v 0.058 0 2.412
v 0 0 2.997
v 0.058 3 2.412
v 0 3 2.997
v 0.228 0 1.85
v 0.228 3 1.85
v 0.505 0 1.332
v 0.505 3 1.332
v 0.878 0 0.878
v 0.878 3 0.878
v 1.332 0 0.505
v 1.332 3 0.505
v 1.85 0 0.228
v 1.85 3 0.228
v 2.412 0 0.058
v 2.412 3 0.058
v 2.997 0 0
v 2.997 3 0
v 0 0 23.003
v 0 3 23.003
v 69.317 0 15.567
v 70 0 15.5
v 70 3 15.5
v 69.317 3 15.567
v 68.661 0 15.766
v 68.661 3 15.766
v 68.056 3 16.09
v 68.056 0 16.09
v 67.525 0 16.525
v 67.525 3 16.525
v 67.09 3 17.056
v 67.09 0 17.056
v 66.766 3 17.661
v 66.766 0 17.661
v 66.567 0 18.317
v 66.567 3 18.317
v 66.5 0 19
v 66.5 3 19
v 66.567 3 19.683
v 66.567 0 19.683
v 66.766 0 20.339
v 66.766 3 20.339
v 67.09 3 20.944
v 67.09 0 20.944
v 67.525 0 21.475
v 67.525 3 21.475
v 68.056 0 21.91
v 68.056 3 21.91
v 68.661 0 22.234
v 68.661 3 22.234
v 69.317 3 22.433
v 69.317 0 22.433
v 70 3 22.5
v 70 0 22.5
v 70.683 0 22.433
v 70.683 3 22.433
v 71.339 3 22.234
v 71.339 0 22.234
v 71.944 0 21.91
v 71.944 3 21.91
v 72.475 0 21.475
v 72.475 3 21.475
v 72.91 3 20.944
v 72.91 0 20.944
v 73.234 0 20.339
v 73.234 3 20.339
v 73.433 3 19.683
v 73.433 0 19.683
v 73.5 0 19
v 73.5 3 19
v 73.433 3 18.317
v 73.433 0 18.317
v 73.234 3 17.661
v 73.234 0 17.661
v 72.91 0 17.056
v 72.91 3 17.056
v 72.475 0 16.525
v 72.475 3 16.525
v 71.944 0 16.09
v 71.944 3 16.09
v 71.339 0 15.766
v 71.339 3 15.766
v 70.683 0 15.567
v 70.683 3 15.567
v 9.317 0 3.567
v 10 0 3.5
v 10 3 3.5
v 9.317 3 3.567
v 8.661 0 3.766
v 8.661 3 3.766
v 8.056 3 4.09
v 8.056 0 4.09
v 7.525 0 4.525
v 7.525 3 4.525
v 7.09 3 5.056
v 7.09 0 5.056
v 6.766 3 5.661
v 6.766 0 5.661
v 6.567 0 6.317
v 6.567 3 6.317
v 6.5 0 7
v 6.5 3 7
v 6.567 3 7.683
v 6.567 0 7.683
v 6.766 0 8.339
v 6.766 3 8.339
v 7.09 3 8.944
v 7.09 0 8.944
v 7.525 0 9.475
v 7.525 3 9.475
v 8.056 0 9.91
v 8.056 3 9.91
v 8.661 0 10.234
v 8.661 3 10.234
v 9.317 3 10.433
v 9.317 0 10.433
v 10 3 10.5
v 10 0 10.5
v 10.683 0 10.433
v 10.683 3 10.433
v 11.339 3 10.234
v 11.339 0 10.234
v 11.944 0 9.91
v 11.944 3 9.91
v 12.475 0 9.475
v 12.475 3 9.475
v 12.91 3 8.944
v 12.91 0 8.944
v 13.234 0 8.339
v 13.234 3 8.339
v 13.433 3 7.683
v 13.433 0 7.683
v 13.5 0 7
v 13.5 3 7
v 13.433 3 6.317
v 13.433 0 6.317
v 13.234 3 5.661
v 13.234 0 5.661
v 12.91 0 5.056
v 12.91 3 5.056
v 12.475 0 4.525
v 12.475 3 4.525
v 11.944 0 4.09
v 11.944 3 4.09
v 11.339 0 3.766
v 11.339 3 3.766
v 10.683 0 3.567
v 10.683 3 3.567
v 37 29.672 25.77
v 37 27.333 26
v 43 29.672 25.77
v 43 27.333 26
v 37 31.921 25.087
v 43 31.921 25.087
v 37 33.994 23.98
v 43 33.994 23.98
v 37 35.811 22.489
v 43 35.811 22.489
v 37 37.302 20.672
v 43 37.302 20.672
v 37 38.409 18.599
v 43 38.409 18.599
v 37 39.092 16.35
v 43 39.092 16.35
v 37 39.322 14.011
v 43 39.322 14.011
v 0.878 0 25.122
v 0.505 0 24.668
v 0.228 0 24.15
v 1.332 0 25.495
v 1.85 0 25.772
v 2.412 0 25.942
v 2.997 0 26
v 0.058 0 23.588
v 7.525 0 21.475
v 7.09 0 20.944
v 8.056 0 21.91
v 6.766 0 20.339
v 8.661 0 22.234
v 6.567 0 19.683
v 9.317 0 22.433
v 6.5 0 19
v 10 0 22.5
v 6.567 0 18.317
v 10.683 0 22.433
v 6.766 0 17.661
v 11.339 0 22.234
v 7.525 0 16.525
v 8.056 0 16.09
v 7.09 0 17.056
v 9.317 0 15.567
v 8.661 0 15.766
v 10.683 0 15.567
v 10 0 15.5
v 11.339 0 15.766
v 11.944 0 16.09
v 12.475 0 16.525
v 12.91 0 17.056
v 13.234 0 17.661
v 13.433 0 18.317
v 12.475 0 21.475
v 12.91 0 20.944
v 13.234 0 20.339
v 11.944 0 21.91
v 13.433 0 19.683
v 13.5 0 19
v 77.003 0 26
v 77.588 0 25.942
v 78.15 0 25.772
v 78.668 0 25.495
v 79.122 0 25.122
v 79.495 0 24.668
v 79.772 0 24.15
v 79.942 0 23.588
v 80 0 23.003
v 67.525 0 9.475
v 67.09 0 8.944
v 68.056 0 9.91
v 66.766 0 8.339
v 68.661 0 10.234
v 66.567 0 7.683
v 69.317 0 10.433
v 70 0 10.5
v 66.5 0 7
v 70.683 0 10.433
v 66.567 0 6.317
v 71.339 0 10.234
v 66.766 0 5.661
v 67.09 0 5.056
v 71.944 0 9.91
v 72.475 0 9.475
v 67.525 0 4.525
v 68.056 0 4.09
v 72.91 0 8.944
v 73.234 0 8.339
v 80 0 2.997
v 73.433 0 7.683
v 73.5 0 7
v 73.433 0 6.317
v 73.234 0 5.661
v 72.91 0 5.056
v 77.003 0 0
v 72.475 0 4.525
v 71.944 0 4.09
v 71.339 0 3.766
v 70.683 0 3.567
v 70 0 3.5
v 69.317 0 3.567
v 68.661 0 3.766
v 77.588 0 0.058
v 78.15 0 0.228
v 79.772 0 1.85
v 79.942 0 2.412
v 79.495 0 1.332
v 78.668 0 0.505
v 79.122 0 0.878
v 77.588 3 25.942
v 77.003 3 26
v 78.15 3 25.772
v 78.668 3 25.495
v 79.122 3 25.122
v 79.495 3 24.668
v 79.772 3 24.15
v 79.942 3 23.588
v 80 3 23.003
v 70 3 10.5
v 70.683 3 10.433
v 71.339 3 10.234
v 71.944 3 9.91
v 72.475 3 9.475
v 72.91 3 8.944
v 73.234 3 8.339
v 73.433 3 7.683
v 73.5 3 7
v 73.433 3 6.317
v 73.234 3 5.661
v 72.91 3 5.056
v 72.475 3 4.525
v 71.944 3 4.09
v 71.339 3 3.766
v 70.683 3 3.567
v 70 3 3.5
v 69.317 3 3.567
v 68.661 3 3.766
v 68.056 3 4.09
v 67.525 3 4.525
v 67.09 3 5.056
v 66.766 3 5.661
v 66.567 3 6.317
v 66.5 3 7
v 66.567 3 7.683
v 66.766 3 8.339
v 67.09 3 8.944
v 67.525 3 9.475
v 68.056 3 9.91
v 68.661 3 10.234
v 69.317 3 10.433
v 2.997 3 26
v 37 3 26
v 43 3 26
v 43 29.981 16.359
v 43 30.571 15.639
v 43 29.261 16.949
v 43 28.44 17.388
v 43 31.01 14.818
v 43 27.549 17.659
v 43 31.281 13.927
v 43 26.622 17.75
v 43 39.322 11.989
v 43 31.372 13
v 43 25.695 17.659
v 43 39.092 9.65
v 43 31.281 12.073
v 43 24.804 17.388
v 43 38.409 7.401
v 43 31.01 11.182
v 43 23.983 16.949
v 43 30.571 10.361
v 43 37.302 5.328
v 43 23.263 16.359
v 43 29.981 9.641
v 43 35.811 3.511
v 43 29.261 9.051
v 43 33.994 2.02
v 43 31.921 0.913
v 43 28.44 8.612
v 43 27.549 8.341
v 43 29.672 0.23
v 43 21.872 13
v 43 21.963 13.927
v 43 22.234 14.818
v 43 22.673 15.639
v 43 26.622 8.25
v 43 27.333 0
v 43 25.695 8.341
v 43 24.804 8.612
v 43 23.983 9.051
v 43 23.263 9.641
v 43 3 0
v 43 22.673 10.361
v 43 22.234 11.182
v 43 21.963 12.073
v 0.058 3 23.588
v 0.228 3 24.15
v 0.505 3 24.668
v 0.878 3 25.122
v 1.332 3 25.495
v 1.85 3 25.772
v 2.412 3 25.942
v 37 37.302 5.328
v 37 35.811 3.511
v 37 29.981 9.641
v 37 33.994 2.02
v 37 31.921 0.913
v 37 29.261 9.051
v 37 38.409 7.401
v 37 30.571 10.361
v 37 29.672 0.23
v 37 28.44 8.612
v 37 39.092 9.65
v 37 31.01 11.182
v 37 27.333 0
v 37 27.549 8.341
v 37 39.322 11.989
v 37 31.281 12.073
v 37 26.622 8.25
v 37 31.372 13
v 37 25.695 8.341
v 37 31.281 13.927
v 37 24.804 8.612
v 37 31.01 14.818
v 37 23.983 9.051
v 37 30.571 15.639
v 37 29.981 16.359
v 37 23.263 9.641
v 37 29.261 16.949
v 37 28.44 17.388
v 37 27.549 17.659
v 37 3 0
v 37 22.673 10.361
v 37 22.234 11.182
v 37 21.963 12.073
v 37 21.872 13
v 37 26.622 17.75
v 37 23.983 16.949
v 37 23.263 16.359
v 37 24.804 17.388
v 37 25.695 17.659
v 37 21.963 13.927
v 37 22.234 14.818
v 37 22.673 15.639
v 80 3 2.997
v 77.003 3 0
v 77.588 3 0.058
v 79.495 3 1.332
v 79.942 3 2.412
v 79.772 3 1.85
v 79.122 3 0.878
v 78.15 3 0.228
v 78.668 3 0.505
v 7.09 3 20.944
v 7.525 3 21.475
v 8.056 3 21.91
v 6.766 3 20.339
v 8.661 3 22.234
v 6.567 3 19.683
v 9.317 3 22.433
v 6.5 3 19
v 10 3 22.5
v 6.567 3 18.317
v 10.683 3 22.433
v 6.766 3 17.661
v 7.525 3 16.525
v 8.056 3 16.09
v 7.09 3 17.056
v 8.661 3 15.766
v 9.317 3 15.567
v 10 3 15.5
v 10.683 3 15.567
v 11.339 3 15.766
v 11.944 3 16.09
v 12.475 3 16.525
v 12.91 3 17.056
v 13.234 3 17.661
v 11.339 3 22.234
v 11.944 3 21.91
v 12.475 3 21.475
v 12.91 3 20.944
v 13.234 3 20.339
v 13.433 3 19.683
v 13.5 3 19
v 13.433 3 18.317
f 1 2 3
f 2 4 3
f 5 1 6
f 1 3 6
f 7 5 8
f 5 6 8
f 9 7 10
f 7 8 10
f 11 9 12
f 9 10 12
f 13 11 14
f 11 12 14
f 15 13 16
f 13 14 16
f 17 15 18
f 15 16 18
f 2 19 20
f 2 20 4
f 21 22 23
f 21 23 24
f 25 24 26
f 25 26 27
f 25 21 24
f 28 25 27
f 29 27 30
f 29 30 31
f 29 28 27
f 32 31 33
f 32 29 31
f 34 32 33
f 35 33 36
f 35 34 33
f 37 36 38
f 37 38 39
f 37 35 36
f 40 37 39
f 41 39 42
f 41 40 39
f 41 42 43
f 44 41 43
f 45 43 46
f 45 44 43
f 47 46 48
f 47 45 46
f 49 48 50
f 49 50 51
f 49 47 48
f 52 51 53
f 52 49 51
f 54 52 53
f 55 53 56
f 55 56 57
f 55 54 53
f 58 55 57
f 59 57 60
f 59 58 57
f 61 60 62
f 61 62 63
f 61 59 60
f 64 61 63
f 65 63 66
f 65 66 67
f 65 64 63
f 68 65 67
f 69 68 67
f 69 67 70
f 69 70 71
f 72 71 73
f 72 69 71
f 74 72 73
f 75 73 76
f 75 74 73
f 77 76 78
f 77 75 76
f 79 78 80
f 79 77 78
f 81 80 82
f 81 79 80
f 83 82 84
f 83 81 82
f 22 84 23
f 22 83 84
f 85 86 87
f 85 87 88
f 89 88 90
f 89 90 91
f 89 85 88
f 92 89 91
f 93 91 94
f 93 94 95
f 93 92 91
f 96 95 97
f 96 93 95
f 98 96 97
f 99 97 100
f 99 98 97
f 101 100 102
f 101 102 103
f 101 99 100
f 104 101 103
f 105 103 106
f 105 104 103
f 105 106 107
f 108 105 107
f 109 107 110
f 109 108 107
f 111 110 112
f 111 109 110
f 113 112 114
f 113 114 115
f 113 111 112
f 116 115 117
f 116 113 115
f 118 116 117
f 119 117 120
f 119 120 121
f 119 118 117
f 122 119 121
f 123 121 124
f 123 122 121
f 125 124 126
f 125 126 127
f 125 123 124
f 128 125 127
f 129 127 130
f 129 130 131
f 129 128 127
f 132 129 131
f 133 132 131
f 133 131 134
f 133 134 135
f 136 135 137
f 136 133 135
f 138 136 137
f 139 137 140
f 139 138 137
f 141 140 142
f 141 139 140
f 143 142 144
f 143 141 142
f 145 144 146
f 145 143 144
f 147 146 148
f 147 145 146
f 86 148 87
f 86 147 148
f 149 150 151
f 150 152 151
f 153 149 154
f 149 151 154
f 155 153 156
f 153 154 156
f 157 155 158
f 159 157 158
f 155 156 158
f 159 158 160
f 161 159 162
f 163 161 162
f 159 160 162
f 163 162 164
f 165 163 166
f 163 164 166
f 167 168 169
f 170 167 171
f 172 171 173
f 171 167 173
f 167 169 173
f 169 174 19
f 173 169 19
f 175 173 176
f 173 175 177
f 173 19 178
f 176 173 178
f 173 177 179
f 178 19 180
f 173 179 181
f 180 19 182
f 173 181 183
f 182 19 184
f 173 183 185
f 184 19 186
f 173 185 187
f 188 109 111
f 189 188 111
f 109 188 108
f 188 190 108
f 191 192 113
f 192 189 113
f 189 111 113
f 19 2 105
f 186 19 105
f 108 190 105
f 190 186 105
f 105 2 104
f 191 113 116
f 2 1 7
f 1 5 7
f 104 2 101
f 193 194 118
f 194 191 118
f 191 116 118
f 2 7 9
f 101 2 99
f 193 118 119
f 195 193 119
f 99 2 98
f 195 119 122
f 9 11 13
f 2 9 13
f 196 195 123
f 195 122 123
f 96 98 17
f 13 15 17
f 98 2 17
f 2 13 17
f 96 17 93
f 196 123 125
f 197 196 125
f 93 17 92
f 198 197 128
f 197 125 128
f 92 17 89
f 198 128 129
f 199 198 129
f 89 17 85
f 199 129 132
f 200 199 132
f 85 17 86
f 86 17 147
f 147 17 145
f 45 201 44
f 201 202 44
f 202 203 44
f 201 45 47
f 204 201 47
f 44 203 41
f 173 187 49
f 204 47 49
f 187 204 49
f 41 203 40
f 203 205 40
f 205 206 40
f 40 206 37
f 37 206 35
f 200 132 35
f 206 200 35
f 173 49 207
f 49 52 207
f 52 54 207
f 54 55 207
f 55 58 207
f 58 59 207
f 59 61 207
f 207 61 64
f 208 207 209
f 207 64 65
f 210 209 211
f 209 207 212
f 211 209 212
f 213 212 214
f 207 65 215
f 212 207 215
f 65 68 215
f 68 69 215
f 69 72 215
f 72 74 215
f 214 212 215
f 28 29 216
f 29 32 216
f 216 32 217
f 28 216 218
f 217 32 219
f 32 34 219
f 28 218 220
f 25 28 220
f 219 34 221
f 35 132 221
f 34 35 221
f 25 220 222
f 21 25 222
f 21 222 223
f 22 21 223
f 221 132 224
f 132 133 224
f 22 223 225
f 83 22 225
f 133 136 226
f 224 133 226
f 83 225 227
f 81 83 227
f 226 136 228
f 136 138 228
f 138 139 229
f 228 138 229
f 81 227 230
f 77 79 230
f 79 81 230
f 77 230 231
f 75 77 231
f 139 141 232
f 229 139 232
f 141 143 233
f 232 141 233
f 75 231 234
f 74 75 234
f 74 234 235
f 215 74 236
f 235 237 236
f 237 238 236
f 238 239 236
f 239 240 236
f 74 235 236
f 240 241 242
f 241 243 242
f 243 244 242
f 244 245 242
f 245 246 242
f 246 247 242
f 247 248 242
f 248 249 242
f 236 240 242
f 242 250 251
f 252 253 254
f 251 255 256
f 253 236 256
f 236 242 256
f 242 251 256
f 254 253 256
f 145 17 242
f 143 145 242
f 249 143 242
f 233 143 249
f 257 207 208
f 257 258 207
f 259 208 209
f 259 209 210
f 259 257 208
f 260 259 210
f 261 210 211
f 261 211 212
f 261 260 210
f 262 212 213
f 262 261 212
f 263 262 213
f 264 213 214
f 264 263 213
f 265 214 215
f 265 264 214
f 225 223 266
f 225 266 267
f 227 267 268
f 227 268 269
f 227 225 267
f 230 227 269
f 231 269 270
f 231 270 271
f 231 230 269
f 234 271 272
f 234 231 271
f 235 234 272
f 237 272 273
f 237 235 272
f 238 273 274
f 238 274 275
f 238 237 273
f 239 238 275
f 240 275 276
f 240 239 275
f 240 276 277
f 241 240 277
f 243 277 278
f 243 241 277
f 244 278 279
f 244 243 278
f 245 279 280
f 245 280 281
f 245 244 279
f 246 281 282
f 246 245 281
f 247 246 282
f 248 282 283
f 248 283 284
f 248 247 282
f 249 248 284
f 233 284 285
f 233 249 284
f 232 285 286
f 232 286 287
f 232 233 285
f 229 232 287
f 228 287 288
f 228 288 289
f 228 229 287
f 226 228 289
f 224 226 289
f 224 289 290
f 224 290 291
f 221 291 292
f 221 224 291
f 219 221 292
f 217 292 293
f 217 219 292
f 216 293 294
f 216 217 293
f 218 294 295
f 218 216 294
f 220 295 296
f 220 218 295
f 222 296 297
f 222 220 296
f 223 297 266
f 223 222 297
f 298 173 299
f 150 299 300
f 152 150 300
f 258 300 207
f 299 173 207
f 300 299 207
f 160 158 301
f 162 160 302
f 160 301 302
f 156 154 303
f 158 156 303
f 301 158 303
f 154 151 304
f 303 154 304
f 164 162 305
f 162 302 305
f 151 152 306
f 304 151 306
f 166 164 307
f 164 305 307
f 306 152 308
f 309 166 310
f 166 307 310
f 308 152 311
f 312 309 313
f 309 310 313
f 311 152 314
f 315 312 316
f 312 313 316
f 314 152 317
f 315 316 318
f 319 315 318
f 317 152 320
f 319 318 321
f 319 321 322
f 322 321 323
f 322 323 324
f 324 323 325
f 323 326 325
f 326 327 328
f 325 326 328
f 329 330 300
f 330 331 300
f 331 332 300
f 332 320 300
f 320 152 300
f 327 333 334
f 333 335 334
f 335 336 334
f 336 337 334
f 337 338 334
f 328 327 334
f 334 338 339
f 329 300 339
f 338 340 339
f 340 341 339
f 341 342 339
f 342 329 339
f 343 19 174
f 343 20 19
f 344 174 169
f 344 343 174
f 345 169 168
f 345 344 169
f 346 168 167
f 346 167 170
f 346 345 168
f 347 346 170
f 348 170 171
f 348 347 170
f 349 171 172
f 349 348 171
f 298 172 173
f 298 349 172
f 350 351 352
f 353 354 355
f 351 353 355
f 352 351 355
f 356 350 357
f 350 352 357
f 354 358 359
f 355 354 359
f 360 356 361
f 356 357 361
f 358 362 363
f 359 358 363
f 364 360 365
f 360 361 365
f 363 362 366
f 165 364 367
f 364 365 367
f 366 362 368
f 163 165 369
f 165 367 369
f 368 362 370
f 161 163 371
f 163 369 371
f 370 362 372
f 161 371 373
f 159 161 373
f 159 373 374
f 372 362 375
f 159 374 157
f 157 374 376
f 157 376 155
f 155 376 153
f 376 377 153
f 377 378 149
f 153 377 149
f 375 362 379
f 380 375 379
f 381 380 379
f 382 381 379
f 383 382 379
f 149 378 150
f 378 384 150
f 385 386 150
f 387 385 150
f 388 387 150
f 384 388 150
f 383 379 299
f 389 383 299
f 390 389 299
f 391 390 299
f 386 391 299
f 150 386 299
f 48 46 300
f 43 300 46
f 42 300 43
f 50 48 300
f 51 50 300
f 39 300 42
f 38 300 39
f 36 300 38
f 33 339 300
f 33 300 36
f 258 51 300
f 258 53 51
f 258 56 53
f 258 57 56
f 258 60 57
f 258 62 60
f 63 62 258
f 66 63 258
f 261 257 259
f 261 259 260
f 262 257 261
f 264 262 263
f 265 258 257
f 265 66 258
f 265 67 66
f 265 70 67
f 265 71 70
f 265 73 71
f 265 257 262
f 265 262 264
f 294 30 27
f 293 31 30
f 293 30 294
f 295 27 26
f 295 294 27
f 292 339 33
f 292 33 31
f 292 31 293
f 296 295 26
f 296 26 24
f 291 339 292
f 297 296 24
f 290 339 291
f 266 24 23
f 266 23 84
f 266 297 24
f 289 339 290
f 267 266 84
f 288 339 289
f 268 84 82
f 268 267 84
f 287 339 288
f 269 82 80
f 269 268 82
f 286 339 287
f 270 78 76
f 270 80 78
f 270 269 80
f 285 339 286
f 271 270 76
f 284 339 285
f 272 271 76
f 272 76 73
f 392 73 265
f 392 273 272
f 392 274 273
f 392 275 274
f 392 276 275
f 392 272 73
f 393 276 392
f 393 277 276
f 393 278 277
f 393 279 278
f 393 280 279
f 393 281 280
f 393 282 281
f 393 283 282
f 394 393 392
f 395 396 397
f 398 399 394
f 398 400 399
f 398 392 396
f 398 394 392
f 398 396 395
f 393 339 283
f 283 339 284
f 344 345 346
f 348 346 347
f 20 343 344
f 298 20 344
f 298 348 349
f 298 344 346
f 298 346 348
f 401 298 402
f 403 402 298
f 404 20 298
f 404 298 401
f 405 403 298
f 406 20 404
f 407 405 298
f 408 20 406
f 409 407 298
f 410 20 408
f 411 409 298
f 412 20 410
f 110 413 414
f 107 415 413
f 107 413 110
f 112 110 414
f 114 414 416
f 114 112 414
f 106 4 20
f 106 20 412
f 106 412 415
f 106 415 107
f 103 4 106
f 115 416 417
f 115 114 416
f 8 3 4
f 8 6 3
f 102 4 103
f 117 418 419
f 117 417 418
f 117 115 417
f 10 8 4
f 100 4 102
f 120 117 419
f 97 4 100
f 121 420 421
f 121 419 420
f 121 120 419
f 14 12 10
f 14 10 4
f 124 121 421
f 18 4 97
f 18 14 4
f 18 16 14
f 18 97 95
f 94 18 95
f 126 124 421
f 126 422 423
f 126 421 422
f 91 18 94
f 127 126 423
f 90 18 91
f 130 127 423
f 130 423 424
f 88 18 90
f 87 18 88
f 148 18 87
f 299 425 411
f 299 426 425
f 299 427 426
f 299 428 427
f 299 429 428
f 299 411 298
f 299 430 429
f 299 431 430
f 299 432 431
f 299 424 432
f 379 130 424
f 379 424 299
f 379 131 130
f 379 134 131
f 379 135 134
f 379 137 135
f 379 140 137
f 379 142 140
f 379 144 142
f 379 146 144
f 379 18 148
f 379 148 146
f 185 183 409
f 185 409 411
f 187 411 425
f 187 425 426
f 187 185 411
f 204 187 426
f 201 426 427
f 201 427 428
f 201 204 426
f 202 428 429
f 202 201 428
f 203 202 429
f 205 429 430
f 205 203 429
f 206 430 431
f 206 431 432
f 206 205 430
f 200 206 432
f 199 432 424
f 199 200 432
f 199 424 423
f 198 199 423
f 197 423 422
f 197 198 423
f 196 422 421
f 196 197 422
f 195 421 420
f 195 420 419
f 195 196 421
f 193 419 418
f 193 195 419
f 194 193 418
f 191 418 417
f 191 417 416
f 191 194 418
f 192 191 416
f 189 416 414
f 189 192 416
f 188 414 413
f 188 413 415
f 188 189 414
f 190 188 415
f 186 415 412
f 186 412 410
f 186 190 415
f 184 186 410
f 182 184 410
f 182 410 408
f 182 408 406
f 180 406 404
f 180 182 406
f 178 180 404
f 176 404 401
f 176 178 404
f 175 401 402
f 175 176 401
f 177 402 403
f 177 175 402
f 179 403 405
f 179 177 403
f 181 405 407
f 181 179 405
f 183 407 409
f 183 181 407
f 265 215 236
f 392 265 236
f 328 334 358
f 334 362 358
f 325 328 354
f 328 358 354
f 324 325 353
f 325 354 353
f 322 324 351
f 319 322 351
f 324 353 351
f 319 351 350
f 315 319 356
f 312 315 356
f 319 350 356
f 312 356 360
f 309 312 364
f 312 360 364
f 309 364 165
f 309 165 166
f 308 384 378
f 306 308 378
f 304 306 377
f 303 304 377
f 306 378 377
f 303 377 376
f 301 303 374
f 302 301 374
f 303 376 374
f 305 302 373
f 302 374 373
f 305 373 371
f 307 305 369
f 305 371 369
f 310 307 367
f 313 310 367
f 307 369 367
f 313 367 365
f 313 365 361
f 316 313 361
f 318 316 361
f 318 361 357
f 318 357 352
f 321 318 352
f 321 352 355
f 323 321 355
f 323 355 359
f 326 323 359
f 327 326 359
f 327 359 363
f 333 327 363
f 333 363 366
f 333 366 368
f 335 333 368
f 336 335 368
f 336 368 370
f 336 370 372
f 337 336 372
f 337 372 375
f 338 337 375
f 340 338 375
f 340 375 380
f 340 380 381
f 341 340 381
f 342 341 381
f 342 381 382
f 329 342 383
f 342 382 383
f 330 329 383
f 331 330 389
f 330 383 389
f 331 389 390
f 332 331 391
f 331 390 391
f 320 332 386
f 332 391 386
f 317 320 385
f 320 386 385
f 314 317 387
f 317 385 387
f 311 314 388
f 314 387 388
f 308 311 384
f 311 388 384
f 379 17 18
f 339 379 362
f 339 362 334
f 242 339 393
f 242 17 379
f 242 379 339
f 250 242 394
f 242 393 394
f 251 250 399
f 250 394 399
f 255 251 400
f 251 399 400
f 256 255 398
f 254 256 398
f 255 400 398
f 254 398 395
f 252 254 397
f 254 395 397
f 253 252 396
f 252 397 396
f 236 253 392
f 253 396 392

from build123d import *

# Parameters (mm, degrees)
SKETCH1_W           = 80
SKETCH1_H           = 26
SKETCH1_R           = 3.5
BOSS_EXTRUDE1_DEPTH = 3
FILLET1_R           = 2.9972
BOSS_EXTRUDE2_DEPTH = 36.322
FILLET2_R           = 11.9888
CUT_EXTRUDE1_REACH  = 45
SKETCH3_R           = 4.75


with BuildPart() as part:
    # Sketch1 → Boss-Extrude1 (new body)
    with BuildSketch(Plane(origin=(0, 0, 0), x_dir=(1, 0, 0), z_dir=(0, 1, 0))):
        with Locations((40, -13)):
            Rectangle(SKETCH1_W, SKETCH1_H)
        with Locations(Location((10, -19, 0), (0, 0, 270))):  # turned: the seam where the file's is
            Circle(SKETCH1_R, mode=Mode.SUBTRACT)
        with Locations(Location((10, -7, 0), (0, 0, 90))):  # turned: the seam where the file's is
            Circle(SKETCH1_R, mode=Mode.SUBTRACT)
        with Locations(Location((70, -7, 0), (0, 0, 270))):  # turned: the seam where the file's is
            Circle(SKETCH1_R, mode=Mode.SUBTRACT)
        with Locations(Location((70, -19, 0), (0, 0, 90))):  # turned: the seam where the file's is
            Circle(SKETCH1_R, mode=Mode.SUBTRACT)
    extrude(amount=BOSS_EXTRUDE1_DEPTH)

    # Fillet1
    fillet1_edges = [part.edges().sort_by_distance(p)[0] for p in [
        (0, 1.5, 0),
        (80, 1.5, 0),
        (80, 1.5, 26),
        (0, 1.5, 26),
    ]]
    fillet(fillet1_edges, radius=FILLET1_R)

    # Sketch2 → Boss-Extrude2 (add)
    with BuildSketch(Plane(origin=(0, 3, 0), x_dir=(1, 0, 0), z_dir=(0, 1, 0))):
        Polygon((43, 0), (40, 0), (37, 0), (37, -26), (40, -26), (43, -26), align=None)
    extrude(amount=BOSS_EXTRUDE2_DEPTH)

    # Fillet2
    fillet2_edges = [part.edges().sort_by_distance(p)[0] for p in [
        (40, 39.322, 26),
        (40, 39.322, 0),
    ]]
    fillet(fillet2_edges, radius=FILLET2_R)

    # Sketch3 → Cut-Extrude1 (cut, up to next)
    with BuildSketch(Plane.ZY.offset(-37), mode=Mode.PRIVATE) as cut_extrude1_sk1:
        with Locations((13, 26.622)):
            Circle(SKETCH3_R)
    cut_extrude1_tool1 = extrude(cut_extrude1_sk1.sketch, amount=-CUT_EXTRUDE1_REACH, mode=Mode.PRIVATE) & part.part
    add(cut_extrude1_tool1.solids().sort_by_distance((37, 26.622, 13))[0], mode=Mode.SUBTRACT)


solid = part.part
